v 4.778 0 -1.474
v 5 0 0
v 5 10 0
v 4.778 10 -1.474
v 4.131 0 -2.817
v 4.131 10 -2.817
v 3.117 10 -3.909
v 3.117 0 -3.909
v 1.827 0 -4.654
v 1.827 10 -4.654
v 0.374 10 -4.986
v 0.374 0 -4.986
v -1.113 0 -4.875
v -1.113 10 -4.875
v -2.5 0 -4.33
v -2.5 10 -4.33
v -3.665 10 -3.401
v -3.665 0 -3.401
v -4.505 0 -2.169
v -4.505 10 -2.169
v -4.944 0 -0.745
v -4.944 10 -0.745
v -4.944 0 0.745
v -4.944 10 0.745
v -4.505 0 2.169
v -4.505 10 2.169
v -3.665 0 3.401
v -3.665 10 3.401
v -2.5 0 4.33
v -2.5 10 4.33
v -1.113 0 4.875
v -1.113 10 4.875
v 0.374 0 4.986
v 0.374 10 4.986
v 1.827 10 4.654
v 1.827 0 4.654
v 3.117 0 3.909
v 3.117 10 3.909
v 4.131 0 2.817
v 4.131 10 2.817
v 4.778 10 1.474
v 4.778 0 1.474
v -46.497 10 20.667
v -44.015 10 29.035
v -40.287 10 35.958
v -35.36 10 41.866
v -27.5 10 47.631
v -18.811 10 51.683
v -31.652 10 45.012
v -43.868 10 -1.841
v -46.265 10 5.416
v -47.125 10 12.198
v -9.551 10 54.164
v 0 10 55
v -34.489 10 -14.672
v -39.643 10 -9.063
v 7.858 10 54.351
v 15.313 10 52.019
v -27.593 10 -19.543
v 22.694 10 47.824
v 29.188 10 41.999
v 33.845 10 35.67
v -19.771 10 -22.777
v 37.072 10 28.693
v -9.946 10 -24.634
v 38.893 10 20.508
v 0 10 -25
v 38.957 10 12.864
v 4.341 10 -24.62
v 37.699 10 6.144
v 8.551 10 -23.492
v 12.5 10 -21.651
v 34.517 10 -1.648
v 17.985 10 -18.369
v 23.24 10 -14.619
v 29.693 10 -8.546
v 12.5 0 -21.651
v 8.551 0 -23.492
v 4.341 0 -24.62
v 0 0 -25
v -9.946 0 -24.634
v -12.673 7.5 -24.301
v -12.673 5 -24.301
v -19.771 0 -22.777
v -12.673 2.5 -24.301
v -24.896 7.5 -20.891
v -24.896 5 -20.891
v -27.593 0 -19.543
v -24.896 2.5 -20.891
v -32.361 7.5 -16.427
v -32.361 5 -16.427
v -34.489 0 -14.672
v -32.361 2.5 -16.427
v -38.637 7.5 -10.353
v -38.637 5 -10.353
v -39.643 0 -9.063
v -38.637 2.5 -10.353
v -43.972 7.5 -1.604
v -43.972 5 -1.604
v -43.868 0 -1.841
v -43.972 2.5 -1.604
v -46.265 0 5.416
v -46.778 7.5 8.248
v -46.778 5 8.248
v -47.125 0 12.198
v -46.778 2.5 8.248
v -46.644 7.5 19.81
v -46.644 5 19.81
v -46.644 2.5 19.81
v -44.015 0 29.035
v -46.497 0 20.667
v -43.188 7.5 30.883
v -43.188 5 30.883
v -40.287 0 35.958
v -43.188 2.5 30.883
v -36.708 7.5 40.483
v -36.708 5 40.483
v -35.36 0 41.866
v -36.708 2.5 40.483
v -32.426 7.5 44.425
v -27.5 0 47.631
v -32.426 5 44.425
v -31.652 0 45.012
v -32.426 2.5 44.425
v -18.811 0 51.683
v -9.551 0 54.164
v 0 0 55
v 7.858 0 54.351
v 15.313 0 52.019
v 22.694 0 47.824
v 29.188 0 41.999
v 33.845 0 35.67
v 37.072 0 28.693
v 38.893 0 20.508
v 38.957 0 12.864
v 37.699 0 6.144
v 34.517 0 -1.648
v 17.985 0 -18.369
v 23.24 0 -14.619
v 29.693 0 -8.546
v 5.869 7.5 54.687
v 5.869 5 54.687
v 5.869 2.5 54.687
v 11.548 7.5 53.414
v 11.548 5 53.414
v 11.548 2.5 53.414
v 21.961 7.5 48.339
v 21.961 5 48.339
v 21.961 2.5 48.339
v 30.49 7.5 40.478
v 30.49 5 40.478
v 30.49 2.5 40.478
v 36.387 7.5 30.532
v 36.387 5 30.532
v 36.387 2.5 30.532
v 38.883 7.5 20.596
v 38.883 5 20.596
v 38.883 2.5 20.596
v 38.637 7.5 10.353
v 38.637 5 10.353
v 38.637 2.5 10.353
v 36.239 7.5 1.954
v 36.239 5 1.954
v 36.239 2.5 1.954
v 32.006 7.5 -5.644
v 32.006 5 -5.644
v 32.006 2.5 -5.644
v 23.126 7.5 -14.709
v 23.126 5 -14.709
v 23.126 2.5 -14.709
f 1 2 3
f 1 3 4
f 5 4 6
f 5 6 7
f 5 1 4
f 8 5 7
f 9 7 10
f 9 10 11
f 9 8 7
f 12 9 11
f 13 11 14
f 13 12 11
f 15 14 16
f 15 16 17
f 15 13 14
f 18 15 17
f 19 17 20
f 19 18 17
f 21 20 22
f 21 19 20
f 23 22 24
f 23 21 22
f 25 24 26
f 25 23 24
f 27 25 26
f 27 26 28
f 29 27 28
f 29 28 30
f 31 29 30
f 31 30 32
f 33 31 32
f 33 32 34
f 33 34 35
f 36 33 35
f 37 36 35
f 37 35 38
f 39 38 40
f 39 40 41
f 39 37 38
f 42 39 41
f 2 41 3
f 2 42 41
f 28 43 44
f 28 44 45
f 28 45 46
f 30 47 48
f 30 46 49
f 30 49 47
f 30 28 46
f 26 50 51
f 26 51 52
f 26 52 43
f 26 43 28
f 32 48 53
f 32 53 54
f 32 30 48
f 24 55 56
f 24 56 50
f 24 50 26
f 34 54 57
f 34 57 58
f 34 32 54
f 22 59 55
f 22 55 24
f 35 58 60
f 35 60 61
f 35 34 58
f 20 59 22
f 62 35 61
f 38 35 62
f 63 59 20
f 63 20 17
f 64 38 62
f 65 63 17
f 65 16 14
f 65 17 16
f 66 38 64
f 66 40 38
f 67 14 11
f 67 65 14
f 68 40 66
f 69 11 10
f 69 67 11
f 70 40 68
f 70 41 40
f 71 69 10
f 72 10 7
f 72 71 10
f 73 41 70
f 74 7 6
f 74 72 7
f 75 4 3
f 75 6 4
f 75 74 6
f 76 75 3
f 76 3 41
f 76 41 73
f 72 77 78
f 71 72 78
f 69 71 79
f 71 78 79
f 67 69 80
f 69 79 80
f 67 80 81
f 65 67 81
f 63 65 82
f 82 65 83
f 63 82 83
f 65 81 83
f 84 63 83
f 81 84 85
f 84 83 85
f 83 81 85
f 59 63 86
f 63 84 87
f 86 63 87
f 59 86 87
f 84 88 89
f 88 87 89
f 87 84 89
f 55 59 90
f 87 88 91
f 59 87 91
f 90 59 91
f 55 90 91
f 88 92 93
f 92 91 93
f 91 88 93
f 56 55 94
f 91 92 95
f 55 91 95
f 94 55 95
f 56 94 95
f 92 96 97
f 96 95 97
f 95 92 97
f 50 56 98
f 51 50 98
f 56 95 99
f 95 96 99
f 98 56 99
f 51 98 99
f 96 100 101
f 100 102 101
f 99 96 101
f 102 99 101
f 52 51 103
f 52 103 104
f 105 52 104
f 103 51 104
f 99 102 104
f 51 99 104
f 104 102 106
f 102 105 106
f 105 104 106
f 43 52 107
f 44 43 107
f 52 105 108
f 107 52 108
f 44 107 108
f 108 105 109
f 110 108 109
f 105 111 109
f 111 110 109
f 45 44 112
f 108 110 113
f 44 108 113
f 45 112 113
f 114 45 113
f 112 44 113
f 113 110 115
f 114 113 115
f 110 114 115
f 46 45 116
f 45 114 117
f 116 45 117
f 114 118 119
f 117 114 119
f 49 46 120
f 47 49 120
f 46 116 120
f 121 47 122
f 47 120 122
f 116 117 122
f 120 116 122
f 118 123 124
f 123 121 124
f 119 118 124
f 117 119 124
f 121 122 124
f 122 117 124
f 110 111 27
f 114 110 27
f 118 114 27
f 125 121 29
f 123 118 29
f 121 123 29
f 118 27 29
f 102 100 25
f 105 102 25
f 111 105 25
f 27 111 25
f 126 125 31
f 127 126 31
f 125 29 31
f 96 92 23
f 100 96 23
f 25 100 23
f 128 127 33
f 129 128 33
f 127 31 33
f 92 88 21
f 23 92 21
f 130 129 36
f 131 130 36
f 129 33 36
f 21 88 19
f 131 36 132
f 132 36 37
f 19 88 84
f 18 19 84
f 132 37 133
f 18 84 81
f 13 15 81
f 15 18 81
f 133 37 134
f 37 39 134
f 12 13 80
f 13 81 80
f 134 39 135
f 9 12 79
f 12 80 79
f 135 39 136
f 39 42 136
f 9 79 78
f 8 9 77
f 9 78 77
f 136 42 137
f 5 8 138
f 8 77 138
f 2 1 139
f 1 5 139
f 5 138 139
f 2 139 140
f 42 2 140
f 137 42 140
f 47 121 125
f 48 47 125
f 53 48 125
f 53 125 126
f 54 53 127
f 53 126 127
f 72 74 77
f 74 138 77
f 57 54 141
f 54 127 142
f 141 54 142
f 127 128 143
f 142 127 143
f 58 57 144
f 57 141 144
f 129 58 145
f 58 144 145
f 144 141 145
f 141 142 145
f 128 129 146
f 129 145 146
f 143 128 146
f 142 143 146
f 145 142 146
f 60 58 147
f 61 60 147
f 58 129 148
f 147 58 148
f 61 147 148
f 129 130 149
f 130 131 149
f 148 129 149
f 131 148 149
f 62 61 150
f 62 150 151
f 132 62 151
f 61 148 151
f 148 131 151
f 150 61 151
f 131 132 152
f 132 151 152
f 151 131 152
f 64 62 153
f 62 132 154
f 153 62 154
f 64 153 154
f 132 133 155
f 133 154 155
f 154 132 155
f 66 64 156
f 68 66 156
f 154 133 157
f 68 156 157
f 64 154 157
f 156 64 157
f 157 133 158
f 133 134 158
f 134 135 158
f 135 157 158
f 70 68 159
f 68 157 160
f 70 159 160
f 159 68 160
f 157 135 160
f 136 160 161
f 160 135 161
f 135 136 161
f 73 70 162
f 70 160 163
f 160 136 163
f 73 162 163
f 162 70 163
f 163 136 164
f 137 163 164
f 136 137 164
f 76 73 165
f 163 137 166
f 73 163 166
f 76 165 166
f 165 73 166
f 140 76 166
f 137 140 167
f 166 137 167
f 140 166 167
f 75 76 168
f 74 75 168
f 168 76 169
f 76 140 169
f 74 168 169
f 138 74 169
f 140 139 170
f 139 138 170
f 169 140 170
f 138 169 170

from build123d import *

# Parameters (mm, degrees)
SKETCH2_R           = 5
BOSS_EXTRUDE1_DEPTH = 10


with BuildPart() as part:
    # Sketch2 → Boss-Extrude1 (new body)
    with BuildSketch(Plane(origin=(0, 0, 0), x_dir=(1, 0, 0), z_dir=(0, 1, 0))):
        with BuildLine():
            ThreePointArc((-27.5, -47.631397208), (-14.235047481, -53.125920446), (0, -55))
            add(Edge.make_bspline(
                [(0, -55), (15.821995191, -55.521684642), (37.158196695, -40.15721482), (40.409843735, -11.080588617), (32.003444862, 9.061174356), (19.786389501, 17.600648721), (12.5, 21.650635095)],
                knots=[0, 0, 0, 0, 0.421298926, 0.607822378, 0.766892621, 1, 1, 1, 1], degree=3))
            ThreePointArc((12.5, 21.650635095), (6.470476128, 24.148145657), (0, 25))
            add(Edge.make_bspline(
                [(0, 25), (-8.335191597, 25.135803666), (-23.185209081, 23.848929612), (-40.536245546, 10.608850636), (-52.258549707, -16.198069832), (-41.463092095, -40.172191766), (-27.5, -47.631397208)],
                knots=[0, 0, 0, 0, 0.233107379, 0.392177622, 0.578701074, 1, 1, 1, 1], degree=3))
        make_face()
        Circle(SKETCH2_R, mode=Mode.SUBTRACT)
    extrude(amount=BOSS_EXTRUDE1_DEPTH)


solid = part.part
